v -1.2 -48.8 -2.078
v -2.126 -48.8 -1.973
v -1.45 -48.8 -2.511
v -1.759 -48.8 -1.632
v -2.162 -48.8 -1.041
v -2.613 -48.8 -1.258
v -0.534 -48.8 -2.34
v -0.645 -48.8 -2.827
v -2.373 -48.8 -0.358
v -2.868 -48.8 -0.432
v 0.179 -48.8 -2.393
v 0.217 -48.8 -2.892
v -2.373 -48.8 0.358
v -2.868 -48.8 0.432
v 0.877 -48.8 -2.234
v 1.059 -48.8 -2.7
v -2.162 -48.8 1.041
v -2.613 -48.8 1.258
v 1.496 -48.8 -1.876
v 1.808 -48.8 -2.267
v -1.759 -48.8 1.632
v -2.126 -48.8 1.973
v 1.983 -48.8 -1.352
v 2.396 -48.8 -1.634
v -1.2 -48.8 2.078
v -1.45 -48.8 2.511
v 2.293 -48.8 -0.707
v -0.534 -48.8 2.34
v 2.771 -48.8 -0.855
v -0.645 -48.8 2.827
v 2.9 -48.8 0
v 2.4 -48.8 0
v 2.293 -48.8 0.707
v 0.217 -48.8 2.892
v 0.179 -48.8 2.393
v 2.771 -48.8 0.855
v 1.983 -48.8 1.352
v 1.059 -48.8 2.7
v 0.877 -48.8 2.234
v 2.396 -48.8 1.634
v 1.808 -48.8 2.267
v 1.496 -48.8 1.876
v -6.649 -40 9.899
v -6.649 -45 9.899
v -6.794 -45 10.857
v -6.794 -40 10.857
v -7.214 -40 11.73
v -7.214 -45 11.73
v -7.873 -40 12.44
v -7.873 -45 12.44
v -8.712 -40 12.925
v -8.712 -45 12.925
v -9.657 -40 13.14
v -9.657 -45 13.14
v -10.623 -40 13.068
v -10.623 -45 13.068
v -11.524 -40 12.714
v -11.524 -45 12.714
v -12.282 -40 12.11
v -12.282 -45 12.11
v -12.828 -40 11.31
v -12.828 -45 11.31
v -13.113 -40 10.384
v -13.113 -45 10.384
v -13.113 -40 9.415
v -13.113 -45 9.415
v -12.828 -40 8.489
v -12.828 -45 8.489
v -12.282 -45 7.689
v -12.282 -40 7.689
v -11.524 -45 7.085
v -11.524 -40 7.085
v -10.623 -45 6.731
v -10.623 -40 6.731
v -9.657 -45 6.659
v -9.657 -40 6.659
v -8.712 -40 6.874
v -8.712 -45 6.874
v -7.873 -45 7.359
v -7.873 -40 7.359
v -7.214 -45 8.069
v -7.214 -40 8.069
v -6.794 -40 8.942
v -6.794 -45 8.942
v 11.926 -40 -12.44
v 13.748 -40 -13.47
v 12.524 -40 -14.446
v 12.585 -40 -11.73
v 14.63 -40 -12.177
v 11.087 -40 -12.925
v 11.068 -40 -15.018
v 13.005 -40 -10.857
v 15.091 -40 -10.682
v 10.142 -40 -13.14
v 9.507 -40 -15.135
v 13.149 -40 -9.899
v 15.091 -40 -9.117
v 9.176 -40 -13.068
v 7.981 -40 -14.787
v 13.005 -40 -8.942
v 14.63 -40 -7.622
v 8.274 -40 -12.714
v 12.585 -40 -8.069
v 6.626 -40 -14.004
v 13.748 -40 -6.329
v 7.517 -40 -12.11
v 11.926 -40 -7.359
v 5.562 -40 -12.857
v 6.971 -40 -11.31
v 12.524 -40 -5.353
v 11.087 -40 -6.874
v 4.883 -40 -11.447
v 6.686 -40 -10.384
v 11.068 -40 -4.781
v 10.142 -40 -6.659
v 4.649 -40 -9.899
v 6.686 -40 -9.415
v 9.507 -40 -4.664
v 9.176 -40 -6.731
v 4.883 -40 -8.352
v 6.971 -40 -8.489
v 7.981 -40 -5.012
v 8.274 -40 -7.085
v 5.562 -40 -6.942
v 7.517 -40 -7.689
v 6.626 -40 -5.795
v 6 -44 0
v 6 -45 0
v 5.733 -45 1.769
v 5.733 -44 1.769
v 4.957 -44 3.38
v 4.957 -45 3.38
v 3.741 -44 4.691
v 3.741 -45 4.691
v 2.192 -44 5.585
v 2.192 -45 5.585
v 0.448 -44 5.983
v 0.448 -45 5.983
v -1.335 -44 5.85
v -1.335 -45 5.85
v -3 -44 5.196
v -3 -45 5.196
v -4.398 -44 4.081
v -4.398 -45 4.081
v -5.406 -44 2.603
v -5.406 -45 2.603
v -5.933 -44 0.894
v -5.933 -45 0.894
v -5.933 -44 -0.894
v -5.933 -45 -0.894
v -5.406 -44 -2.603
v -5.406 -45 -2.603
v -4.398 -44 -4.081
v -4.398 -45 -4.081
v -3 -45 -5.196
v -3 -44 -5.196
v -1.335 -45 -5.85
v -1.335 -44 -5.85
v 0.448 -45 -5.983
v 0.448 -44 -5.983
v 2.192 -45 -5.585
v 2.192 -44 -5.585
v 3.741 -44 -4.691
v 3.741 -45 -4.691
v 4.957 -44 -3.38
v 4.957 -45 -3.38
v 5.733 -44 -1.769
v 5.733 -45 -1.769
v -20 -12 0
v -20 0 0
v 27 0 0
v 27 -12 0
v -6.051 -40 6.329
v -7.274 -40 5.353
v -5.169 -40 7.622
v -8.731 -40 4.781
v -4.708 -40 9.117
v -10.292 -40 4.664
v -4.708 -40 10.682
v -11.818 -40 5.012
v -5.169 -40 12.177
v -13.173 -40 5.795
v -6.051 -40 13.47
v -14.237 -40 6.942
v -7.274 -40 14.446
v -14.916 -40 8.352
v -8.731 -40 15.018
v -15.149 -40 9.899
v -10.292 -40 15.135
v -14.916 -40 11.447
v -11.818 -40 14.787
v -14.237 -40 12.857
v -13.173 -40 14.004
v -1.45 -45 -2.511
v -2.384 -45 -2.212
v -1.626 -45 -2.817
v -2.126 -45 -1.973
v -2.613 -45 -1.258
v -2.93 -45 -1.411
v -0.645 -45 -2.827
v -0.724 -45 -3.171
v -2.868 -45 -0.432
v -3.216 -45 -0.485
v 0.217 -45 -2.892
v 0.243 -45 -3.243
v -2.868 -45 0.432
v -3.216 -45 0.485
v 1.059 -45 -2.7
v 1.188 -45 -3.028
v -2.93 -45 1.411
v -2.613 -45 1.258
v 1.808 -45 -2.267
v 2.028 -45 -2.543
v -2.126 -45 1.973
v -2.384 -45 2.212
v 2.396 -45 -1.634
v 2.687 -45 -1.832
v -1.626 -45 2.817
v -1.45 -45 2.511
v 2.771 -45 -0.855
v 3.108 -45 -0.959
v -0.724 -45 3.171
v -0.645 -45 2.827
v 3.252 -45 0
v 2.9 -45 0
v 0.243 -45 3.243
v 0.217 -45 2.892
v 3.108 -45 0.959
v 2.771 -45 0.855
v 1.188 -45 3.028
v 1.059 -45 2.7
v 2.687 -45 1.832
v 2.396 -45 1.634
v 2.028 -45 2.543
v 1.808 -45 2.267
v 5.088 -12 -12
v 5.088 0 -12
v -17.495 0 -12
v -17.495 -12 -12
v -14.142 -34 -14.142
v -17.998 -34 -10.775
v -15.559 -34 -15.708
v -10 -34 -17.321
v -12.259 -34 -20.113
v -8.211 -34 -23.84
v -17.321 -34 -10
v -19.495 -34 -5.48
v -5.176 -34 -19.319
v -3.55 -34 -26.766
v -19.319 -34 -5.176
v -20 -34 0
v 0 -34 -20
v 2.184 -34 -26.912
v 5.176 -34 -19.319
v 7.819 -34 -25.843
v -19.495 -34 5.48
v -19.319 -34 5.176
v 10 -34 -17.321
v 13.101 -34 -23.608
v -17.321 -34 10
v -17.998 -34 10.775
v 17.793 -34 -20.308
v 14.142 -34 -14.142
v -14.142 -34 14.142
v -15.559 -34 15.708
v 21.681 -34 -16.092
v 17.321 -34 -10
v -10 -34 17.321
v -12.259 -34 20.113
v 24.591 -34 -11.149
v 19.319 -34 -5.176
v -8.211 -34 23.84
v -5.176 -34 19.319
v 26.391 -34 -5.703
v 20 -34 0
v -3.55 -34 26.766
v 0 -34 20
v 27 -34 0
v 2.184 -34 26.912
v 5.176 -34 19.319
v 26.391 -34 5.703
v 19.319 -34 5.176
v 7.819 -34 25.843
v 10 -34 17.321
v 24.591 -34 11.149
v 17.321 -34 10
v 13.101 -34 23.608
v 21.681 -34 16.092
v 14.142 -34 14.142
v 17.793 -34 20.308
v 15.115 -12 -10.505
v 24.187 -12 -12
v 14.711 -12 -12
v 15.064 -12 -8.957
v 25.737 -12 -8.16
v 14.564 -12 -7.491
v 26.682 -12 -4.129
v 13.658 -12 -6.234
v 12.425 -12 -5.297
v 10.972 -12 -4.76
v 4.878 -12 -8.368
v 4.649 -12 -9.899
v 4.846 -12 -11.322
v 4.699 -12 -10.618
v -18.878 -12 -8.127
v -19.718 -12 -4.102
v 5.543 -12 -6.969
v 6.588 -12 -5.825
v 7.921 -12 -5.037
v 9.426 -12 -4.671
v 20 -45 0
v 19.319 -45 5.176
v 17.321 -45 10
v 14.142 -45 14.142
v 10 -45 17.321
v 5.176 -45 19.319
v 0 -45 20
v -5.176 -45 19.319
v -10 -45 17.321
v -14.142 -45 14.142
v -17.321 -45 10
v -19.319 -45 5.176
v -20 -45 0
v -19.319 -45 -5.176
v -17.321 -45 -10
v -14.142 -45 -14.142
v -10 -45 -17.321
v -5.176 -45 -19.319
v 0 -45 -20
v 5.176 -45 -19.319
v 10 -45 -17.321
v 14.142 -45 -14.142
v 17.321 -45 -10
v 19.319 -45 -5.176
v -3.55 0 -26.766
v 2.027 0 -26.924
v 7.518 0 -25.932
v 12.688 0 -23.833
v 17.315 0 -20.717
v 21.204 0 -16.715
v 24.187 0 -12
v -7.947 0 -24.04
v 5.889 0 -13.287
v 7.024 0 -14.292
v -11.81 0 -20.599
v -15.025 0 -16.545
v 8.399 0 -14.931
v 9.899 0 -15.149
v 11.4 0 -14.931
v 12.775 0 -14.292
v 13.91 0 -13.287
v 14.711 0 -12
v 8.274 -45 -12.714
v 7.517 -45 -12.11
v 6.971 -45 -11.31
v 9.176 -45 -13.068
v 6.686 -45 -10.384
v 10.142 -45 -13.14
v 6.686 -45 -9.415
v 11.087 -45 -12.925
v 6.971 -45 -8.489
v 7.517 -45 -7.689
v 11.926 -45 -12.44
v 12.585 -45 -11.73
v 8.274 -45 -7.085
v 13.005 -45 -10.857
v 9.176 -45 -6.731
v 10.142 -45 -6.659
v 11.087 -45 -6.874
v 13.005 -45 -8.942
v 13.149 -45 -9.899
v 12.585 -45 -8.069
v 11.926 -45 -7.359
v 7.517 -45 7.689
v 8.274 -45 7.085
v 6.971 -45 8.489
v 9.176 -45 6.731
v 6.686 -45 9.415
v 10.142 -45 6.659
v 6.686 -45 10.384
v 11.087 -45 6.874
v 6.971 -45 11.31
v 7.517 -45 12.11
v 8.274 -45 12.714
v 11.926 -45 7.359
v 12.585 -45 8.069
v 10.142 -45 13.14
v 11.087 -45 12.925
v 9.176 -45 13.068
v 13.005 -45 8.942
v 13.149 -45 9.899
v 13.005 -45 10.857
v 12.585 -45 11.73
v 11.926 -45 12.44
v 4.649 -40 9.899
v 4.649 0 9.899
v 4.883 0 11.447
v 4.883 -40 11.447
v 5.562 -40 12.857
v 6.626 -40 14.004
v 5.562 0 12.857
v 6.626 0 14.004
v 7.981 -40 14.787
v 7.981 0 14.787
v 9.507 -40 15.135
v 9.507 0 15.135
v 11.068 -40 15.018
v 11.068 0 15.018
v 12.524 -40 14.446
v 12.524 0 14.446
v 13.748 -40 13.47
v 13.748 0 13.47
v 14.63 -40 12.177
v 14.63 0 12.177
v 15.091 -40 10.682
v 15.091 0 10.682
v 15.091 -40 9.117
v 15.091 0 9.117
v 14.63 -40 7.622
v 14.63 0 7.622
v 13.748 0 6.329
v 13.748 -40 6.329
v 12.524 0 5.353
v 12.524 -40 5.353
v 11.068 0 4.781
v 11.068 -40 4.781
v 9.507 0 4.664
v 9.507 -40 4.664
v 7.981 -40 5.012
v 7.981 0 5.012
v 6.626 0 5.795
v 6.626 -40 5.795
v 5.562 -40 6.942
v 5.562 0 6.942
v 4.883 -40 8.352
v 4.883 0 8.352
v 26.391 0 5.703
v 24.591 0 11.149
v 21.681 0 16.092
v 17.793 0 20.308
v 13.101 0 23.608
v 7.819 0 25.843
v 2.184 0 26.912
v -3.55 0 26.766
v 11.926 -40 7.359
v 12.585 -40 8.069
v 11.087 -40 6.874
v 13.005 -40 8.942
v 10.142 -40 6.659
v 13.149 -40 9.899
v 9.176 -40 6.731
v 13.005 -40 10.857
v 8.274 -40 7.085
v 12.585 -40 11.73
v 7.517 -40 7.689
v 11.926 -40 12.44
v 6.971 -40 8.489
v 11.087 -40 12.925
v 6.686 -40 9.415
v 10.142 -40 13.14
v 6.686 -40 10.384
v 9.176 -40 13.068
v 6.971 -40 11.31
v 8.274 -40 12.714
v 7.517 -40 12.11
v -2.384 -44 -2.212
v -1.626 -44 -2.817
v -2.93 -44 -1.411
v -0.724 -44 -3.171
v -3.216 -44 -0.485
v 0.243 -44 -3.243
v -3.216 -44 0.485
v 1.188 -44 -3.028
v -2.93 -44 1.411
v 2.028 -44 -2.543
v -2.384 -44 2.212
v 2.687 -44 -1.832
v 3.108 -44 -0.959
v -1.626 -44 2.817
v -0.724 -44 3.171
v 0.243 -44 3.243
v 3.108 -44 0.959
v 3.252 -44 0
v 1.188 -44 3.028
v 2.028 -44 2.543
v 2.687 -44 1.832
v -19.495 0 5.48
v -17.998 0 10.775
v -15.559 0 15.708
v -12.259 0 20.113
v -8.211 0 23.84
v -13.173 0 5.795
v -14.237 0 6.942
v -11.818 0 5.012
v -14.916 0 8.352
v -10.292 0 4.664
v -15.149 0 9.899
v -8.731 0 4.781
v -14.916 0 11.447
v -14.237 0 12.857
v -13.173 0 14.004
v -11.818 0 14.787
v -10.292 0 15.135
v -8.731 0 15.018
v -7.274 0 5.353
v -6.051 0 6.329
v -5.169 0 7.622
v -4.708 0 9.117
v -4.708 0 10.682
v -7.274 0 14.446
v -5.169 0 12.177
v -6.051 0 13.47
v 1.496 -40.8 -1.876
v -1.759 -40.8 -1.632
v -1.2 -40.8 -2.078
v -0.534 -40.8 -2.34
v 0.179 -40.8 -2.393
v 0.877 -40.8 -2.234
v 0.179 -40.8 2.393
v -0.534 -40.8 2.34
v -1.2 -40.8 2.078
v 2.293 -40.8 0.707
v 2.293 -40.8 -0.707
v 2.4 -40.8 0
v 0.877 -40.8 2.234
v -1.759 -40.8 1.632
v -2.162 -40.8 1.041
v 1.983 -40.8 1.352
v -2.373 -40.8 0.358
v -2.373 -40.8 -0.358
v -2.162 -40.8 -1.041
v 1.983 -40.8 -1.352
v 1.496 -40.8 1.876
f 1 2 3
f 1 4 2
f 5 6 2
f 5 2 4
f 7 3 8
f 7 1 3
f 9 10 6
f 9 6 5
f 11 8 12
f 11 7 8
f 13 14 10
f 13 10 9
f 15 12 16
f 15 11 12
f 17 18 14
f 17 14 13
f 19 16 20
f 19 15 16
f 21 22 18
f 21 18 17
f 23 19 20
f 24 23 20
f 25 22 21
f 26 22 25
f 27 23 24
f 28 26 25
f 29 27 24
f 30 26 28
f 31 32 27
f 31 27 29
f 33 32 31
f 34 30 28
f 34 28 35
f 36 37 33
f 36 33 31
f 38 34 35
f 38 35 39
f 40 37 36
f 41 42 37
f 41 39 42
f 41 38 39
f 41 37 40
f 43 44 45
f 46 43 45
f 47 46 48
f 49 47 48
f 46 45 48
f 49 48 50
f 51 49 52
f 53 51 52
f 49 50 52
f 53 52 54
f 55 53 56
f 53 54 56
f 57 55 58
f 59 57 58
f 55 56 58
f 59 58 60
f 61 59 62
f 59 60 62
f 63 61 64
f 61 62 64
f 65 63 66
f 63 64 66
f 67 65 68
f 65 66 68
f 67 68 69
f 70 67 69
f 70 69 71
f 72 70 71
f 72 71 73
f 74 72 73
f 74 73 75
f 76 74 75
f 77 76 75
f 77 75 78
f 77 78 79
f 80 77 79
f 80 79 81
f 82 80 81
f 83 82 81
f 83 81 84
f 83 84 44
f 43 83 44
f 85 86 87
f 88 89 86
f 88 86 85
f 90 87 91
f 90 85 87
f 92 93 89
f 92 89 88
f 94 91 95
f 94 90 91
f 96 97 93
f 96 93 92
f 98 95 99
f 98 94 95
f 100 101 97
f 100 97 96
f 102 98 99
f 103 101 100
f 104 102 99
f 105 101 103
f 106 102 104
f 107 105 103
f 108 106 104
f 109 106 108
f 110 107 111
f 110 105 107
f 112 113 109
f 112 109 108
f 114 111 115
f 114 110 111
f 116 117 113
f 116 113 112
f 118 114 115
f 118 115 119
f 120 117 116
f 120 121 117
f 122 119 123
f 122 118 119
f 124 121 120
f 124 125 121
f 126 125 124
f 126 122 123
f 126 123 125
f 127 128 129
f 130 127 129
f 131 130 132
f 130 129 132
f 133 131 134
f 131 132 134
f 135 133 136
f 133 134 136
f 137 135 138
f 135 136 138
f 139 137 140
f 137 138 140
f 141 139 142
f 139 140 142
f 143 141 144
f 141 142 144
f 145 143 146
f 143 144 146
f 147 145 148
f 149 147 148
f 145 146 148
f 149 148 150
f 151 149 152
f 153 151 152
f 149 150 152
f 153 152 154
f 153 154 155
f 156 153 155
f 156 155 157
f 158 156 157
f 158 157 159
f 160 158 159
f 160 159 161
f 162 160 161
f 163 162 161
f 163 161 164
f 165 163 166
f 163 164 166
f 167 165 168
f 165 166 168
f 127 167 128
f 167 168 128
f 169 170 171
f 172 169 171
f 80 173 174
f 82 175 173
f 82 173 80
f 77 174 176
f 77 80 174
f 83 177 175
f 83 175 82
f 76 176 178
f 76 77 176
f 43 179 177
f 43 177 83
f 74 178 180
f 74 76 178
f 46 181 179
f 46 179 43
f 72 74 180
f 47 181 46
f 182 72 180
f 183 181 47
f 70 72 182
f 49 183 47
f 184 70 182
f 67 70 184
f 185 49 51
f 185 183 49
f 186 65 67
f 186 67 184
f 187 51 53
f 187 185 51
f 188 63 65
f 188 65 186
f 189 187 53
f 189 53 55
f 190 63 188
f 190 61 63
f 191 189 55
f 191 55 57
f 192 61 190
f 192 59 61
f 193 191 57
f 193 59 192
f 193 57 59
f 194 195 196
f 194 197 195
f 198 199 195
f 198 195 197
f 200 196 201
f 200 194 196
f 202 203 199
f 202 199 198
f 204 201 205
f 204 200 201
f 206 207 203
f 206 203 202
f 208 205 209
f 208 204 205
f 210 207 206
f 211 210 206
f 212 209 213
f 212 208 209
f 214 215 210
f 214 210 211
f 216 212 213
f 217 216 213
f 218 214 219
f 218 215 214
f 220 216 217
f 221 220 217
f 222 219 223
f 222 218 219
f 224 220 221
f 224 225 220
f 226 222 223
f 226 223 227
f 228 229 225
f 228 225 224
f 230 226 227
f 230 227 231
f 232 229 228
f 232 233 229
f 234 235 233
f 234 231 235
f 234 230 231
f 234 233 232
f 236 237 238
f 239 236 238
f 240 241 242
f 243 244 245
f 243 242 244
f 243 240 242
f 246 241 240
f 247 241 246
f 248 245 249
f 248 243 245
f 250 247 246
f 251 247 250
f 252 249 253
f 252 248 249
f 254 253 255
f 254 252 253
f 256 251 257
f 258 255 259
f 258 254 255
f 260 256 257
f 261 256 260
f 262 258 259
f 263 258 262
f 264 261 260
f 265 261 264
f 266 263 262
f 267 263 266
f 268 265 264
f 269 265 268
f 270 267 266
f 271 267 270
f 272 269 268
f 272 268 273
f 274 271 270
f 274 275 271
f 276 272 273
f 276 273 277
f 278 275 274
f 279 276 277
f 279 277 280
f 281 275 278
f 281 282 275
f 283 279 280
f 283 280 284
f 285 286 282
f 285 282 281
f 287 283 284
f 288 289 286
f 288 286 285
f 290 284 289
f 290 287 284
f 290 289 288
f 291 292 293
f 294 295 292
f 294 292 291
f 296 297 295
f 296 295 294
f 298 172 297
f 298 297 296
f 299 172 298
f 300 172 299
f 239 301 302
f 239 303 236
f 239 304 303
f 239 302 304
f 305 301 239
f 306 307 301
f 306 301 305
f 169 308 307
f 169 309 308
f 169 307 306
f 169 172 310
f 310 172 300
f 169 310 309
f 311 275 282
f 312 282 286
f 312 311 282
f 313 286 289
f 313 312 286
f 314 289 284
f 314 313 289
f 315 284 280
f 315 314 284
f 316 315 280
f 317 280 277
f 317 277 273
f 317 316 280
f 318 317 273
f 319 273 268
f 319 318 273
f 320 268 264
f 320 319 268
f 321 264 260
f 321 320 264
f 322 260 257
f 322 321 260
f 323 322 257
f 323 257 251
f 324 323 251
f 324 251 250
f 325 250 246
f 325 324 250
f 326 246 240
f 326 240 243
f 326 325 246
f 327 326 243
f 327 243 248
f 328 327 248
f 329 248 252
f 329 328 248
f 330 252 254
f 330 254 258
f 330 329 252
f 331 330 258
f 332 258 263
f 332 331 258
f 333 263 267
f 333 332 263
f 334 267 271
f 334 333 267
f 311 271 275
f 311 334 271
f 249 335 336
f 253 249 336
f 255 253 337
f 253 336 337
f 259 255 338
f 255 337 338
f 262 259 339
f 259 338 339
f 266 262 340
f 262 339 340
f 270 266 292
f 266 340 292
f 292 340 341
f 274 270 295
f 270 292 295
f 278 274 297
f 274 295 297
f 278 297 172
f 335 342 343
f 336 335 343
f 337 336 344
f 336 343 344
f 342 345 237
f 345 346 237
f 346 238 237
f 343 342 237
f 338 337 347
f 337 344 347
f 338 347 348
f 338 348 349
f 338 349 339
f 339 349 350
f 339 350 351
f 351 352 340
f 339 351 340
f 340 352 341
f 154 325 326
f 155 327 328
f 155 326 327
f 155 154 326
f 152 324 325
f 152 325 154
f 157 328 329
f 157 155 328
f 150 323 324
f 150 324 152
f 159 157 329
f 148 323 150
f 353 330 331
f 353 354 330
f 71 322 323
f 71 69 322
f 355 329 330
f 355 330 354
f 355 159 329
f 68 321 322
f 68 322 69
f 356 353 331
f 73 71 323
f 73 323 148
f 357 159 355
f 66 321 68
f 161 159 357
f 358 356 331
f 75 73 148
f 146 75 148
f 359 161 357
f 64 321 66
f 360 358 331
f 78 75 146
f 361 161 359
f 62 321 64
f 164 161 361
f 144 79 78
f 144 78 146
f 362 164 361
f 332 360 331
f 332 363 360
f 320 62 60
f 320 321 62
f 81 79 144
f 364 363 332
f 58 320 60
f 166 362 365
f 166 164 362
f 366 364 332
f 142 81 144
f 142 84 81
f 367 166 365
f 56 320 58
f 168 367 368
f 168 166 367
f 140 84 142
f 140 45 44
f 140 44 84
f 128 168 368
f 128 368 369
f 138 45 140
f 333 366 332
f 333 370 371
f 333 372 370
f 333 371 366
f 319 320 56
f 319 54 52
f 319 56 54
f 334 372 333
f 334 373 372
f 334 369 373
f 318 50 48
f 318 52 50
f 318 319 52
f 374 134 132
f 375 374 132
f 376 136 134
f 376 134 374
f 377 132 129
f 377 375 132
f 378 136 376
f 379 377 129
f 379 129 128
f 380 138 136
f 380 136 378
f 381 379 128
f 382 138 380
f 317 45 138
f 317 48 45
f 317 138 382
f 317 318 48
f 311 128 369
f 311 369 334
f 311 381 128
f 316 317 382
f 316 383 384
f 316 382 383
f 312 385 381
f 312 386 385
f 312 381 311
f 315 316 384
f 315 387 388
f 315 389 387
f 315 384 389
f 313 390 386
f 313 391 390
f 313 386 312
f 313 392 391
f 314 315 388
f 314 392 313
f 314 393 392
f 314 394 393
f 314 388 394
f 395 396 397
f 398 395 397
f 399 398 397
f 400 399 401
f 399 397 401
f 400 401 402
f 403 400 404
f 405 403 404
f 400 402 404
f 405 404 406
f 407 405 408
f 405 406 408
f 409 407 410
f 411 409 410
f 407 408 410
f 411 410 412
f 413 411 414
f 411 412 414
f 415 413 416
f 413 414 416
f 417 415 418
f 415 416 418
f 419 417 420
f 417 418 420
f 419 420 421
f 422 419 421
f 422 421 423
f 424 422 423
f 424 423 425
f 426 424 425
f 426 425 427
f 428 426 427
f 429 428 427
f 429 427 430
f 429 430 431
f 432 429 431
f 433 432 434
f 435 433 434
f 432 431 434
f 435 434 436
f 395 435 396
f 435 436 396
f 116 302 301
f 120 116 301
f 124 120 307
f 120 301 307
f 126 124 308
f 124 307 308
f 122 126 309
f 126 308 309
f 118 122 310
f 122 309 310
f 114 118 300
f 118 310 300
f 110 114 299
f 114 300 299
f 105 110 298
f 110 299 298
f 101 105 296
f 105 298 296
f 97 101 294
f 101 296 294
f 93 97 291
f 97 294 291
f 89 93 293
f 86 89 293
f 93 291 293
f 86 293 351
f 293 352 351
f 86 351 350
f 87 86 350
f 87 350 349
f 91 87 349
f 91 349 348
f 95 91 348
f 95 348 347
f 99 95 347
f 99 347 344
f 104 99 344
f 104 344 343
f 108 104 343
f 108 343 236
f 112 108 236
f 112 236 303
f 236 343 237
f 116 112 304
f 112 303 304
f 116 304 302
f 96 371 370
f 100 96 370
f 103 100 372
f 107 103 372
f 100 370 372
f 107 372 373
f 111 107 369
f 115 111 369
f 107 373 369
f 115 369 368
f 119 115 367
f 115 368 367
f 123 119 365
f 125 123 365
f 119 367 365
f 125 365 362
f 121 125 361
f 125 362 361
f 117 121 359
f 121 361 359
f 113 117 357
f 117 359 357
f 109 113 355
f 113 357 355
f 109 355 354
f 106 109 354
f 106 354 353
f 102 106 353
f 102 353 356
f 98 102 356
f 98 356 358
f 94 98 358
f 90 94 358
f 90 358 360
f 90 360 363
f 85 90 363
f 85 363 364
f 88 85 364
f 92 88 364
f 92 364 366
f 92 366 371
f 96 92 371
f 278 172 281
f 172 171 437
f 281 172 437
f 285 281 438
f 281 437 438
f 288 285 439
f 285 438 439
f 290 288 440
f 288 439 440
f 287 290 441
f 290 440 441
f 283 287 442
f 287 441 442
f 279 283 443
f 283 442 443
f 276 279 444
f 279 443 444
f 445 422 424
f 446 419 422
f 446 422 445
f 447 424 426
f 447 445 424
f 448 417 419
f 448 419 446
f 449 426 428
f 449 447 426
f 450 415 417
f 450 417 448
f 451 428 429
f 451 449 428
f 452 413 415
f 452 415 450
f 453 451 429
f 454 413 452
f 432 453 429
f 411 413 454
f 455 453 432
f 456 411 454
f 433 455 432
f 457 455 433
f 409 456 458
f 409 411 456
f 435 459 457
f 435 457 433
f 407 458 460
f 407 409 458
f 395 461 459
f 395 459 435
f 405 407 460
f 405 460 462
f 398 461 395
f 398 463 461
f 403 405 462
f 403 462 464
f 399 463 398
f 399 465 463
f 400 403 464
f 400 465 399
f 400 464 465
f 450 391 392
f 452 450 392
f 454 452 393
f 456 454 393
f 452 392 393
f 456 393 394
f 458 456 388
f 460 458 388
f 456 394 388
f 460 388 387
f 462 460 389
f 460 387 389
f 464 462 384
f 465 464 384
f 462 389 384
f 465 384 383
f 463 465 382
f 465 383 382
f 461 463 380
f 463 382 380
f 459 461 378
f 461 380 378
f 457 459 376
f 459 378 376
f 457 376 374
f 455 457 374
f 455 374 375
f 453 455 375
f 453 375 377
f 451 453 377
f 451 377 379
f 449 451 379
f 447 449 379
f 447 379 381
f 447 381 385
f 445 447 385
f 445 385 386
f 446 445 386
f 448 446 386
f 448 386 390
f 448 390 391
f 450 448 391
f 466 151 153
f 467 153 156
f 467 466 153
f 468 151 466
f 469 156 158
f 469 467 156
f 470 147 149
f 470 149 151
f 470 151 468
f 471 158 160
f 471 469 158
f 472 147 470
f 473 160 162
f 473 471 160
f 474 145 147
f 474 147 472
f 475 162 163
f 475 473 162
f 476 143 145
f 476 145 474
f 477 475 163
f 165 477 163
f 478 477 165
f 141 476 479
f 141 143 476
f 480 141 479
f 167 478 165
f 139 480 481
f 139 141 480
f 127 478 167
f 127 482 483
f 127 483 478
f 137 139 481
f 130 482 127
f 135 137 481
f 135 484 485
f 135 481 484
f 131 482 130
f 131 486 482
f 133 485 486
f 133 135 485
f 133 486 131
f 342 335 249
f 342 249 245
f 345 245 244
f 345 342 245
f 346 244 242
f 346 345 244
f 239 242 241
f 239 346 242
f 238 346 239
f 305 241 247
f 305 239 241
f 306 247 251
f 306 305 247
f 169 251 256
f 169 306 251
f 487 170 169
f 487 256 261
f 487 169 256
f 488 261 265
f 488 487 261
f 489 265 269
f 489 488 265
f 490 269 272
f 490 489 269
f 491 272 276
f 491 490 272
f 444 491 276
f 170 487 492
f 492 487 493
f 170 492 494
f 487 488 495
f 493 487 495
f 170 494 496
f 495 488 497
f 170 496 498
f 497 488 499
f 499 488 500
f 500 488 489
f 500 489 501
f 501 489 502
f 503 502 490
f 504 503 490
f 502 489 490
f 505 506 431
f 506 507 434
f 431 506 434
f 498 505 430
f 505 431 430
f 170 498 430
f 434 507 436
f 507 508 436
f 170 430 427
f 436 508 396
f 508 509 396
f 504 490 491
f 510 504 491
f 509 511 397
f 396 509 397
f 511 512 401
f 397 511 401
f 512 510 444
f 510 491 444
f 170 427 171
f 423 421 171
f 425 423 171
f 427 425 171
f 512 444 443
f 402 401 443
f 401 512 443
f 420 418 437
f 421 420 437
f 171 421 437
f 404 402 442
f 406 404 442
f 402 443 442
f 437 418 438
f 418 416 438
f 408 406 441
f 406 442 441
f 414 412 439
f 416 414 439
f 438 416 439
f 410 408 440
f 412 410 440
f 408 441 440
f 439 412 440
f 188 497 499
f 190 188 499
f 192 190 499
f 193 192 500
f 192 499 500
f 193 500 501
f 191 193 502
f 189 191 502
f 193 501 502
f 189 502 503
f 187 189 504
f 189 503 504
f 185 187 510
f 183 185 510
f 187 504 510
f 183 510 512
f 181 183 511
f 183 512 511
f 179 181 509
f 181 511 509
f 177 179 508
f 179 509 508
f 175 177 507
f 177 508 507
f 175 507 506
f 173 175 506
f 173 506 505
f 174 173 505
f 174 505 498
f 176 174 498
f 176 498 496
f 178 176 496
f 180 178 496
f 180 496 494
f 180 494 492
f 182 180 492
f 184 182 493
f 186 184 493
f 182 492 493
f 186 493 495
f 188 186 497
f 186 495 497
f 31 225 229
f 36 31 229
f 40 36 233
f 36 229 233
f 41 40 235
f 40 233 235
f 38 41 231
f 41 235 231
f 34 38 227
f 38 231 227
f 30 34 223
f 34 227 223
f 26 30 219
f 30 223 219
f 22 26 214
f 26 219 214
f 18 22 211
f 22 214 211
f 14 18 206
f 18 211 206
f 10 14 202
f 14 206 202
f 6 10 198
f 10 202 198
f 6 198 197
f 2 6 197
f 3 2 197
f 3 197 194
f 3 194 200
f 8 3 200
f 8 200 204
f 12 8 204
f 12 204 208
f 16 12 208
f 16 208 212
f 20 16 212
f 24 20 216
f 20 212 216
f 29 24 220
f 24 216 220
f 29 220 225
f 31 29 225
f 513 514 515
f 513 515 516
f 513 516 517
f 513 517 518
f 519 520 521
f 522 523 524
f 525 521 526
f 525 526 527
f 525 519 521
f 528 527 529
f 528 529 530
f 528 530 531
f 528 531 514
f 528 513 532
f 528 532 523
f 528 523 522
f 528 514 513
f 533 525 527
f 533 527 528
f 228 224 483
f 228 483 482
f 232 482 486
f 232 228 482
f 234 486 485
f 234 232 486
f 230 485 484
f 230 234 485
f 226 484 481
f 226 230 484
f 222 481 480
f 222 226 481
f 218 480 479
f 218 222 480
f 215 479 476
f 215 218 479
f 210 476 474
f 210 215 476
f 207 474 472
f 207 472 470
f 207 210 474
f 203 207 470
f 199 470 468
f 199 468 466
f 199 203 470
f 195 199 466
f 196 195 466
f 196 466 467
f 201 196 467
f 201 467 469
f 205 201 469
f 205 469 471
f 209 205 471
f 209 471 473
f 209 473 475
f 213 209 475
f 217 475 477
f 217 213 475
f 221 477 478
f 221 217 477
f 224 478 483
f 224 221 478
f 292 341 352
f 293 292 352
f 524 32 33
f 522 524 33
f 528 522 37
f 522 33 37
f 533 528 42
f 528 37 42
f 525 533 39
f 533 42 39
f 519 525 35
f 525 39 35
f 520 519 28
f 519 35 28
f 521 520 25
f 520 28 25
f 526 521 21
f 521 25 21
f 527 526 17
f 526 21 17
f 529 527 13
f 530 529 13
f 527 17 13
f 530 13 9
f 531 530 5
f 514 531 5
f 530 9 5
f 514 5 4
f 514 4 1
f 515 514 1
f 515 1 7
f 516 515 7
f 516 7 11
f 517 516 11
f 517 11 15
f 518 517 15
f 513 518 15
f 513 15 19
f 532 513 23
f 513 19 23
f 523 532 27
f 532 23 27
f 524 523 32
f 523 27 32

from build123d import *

# Parameters (mm, degrees)
F0_R      = 27
F1_DEPTH  = 45
F2_R      = 41.8433440982
F2_R_2    = 20
F3_DEPTH  = 11
F5_D      = 6.5
F5_DEPTH  = 50
F5_TIP    = 1.9527970118
F6_R      = 5.25
F7_DEPTH  = 40
F8_R      = 2.9
F9_DEPTH  = 3.8
F10_R     = 2.4
F11_DEPTH = 8
F12_R     = 6
F12_R_2   = 3.2524774455
F13_DEPTH = 1
F15_DEPTH = 12
F16_R     = 45.2689658455
F16_R_2   = 30
F17_DEPTH = 53.4


# Not quite as in the source:
# - a feature names something its author has since deleted; it is built from what else it names


with BuildPart() as f1:
    # F0 (on Front) → F1 (new body)
    with BuildSketch(Plane.XZ):
        Circle(F0_R)
    extrude(amount=F1_DEPTH)

    # F2 (on face) → F3 (cut)
    with BuildSketch(Plane.XZ.offset(45)):
        Circle(F2_R)
        Circle(F2_R_2, mode=Mode.SUBTRACT)
    extrude(amount=-F3_DEPTH, mode=Mode.SUBTRACT)

    # F5
    with Locations(Plane(origin=(0, 0, 0), x_dir=(-1, 0, 0), z_dir=(0, 1, 0))):
        with Locations((-9.8994949366, 9.8994949366), (9.8994949366, 9.8994949366), (-9.8994949366, -9.8994949366)):
            Hole(F5_D / 2, depth=F5_DEPTH)
            with Locations((0, 0, -(F5_DEPTH + F5_TIP / 2))):  # 118° drill point
                Cone(0, F5_D / 2, F5_TIP, mode=Mode.SUBTRACT)

    # F6 (on face) → F7 (cut)
    with BuildSketch(Plane(origin=(0, 0, 0), x_dir=(-1, 0, 0), z_dir=(0, 1, 0))):
        with Locations((-9.8994949366, -9.8994949366)):
            Circle(F6_R)
        with Locations((9.8994949366, 9.8994949366)):
            Circle(F6_R)
        with Locations((-9.8994949366, 9.8994949366)):
            Circle(F6_R)
    extrude(amount=-F7_DEPTH, mode=Mode.SUBTRACT)

    # F8 (on face) → F9 (join)
    with BuildSketch(Plane.XZ.offset(45)):
        Circle(F8_R)
    extrude(amount=F9_DEPTH)

    # F10 (on face) → F11 (cut)
    with BuildSketch(Plane.XZ.offset(48.8)):
        Circle(F10_R)
    extrude(amount=-F11_DEPTH, mode=Mode.SUBTRACT)

    # F12 (on face) → F13 (cut)
    with BuildSketch(Plane.XZ.offset(45)):
        Circle(F12_R)
        Circle(F12_R_2, mode=Mode.SUBTRACT)
    extrude(amount=-F13_DEPTH, mode=Mode.SUBTRACT)

    # F14 (on face) → F15 (cut)
    with BuildSketch(Plane(origin=(0, 0, 0), x_dir=(-1, 0, 0), z_dir=(0, 1, 0))):
        Polygon((39.7908514319, 0), (0, 0), (-37.339406552, 0), (-37.339406552, -12), (41.6823292512, -12), align=None)
    extrude(amount=-F15_DEPTH, mode=Mode.SUBTRACT)

    # F16 (on face) → F17 (cut)
    with BuildSketch(Plane(origin=(0, 0, 0), x_dir=(-1, 0, 0), z_dir=(0, 1, 0))):
        with Locations((-10, 0)):
            Circle(F16_R)
        with Locations((-10, 0)):
            Circle(F16_R_2, mode=Mode.SUBTRACT)
    extrude(amount=-F17_DEPTH, mode=Mode.SUBTRACT)


solid = f1.part
